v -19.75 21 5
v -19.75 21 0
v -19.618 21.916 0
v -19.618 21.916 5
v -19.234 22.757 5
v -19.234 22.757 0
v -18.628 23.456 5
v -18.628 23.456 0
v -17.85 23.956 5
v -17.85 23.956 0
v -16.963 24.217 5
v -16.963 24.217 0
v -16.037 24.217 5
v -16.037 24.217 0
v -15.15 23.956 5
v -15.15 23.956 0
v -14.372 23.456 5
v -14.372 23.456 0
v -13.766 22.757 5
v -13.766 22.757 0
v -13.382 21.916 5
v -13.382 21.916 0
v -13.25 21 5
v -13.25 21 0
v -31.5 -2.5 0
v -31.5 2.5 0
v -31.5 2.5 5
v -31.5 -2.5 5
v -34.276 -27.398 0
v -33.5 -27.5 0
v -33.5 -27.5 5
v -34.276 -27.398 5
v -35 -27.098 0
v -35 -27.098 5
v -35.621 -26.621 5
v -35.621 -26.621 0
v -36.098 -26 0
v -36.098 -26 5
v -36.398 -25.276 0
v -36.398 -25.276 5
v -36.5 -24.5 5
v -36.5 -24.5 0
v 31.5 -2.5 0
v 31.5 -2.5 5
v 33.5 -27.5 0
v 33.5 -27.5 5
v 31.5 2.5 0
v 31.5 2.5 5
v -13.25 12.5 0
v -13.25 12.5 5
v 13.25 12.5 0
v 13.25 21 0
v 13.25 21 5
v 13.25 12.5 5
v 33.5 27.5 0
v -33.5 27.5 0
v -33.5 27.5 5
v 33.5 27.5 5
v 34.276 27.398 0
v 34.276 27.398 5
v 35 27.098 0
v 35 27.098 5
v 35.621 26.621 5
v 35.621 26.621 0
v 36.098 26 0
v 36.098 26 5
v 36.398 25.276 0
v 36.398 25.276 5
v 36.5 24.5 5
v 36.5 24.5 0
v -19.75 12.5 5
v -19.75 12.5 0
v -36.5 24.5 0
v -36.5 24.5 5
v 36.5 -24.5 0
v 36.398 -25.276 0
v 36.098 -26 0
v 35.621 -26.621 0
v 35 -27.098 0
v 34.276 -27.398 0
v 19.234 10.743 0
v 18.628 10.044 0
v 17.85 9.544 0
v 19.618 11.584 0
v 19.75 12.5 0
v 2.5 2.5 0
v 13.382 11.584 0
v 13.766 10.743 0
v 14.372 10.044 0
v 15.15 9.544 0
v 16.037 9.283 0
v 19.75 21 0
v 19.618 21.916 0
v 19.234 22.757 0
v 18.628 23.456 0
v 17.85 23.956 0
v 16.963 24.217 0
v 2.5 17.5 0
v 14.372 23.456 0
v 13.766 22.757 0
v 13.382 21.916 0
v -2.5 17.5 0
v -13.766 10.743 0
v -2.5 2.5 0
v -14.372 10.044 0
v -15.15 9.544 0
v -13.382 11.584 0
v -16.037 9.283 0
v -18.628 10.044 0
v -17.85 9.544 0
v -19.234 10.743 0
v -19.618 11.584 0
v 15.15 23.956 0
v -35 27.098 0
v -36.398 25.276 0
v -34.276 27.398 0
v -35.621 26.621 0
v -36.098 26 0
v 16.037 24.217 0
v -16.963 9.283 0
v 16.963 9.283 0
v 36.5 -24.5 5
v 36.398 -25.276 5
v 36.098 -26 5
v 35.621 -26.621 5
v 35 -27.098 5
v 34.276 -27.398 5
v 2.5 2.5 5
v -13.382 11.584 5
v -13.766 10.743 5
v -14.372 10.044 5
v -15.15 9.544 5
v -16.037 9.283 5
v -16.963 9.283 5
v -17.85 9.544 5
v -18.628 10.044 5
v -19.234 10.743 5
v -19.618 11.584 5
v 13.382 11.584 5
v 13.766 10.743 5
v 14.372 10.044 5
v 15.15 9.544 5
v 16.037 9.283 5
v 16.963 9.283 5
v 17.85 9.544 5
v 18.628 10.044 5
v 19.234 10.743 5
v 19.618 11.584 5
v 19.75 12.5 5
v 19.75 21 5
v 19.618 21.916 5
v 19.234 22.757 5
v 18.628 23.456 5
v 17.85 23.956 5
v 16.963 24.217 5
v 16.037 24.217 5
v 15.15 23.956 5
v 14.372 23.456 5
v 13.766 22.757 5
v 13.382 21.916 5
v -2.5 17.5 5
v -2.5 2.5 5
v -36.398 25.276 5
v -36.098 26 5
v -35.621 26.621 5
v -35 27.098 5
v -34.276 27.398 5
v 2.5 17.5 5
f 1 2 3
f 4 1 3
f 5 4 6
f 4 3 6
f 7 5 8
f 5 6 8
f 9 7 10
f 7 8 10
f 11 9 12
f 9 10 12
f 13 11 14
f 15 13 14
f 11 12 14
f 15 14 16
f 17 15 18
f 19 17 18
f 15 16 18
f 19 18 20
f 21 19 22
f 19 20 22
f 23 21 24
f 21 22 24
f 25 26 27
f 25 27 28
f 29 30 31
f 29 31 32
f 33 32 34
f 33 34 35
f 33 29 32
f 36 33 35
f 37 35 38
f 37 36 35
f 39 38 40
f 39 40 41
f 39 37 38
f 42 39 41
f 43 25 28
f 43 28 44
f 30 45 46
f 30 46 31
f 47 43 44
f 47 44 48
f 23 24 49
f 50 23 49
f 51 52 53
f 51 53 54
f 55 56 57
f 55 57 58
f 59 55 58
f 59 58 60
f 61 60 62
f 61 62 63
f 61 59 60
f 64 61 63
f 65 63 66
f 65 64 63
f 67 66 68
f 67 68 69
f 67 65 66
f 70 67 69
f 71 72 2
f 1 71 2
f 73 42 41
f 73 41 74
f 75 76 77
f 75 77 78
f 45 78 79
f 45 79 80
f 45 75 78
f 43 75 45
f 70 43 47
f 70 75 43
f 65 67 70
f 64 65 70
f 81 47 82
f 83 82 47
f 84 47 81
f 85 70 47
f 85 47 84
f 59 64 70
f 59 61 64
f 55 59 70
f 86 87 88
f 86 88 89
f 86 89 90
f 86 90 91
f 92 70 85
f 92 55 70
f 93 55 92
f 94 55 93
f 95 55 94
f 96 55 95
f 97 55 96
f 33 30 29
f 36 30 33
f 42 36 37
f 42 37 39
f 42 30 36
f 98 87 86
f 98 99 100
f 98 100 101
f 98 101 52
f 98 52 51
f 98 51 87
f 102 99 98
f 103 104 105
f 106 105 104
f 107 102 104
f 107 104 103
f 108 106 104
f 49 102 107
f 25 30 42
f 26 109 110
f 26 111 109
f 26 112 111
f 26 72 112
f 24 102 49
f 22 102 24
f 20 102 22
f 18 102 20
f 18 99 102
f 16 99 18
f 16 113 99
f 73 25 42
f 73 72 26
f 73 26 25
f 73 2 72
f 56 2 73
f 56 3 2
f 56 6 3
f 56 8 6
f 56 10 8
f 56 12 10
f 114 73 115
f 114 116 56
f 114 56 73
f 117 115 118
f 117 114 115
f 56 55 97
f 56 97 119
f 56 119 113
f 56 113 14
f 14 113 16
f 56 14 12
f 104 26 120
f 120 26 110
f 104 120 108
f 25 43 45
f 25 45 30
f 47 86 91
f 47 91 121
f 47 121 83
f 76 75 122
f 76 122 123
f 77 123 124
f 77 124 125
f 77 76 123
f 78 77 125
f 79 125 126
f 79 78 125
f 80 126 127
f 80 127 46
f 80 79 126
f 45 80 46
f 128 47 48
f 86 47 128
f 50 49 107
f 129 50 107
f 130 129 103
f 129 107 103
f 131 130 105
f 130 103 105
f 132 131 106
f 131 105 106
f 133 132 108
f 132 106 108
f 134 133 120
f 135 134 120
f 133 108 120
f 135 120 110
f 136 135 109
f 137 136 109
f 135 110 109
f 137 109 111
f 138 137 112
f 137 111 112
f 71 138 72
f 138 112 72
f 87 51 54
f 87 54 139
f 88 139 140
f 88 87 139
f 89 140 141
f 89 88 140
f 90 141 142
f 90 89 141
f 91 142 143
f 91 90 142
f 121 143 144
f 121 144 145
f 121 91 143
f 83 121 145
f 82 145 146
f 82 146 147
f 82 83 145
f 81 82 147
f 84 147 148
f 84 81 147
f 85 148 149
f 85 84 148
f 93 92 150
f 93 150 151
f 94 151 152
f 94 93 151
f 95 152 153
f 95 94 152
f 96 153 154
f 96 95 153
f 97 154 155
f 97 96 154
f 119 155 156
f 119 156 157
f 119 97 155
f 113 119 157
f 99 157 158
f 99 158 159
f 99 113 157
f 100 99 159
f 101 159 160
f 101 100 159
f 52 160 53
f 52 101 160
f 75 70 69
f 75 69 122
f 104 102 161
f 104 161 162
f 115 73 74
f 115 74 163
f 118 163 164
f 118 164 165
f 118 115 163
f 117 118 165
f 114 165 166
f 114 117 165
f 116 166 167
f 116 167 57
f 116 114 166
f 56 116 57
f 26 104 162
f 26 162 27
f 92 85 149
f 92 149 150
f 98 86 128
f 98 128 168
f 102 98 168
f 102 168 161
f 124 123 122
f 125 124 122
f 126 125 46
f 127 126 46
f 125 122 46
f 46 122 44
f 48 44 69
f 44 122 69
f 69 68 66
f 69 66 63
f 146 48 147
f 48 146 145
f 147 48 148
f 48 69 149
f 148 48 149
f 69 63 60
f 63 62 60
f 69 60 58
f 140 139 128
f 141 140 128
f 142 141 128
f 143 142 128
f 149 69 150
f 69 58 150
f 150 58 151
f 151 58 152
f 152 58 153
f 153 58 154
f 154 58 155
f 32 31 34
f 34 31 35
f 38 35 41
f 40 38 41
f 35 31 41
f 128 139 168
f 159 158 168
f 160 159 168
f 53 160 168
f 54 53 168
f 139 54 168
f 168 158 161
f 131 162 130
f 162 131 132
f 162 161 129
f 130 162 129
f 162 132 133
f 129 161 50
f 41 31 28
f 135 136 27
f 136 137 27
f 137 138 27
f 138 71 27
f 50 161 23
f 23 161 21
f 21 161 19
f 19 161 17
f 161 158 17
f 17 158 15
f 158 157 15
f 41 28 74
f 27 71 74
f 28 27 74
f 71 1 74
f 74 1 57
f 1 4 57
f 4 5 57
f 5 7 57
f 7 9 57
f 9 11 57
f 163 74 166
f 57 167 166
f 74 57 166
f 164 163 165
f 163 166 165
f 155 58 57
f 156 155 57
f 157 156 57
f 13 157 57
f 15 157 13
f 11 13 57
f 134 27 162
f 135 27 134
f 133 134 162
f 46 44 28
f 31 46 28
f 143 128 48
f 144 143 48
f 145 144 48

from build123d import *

# Parameters (mm, degrees)
EXTRUDE_1_DEPTH = 5


with BuildPart() as part:
    # 草图1 → 凸台-拉伸1 (new body)
    with BuildSketch(Plane.XY):
        with BuildLine():
            Line((33.5, -27.5), (-33.5, -27.5))
            ThreePointArc((-33.5, -27.5), (-35.621320344, -26.621320344), (-36.5, -24.5))
            Line((-36.5, -24.5), (-36.5, 24.5))
            ThreePointArc((-36.5, 24.5), (-35.621320344, 26.621320344), (-33.5, 27.5))
            Line((-33.5, 27.5), (33.5, 27.5))
            ThreePointArc((33.5, 27.5), (35.621320344, 26.621320344), (36.5, 24.5))
            Line((36.5, 24.5), (36.5, -24.5))
            ThreePointArc((36.5, -24.5), (35.621320344, -26.621320344), (33.5, -27.5))
        make_face()
        Polygon((-31.5, 2.5), (-31.5, -2.5), (31.5, -2.5), (31.5, 2.5), (2.5, 2.5), (2.5, 17.5), (-2.5, 17.5), (-2.5, 2.5), align=None, mode=Mode.SUBTRACT)
        with BuildLine():
            Line((13.25, 21), (13.25, 12.5))
            ThreePointArc((13.25, 12.5), (16.5, 9.25), (19.75, 12.5))
            Line((19.75, 12.5), (19.75, 21))
            ThreePointArc((19.75, 21), (16.5, 24.25), (13.25, 21))
        make_face(mode=Mode.SUBTRACT)
        with BuildLine():
            Line((-13.25, 21), (-13.25, 12.5))
            ThreePointArc((-13.25, 12.5), (-16.5, 9.25), (-19.75, 12.5))
            Line((-19.75, 12.5), (-19.75, 21))
            ThreePointArc((-19.75, 21), (-16.5, 24.25), (-13.25, 21))
        make_face(mode=Mode.SUBTRACT)
    extrude(amount=EXTRUDE_1_DEPTH)


solid = part.part
